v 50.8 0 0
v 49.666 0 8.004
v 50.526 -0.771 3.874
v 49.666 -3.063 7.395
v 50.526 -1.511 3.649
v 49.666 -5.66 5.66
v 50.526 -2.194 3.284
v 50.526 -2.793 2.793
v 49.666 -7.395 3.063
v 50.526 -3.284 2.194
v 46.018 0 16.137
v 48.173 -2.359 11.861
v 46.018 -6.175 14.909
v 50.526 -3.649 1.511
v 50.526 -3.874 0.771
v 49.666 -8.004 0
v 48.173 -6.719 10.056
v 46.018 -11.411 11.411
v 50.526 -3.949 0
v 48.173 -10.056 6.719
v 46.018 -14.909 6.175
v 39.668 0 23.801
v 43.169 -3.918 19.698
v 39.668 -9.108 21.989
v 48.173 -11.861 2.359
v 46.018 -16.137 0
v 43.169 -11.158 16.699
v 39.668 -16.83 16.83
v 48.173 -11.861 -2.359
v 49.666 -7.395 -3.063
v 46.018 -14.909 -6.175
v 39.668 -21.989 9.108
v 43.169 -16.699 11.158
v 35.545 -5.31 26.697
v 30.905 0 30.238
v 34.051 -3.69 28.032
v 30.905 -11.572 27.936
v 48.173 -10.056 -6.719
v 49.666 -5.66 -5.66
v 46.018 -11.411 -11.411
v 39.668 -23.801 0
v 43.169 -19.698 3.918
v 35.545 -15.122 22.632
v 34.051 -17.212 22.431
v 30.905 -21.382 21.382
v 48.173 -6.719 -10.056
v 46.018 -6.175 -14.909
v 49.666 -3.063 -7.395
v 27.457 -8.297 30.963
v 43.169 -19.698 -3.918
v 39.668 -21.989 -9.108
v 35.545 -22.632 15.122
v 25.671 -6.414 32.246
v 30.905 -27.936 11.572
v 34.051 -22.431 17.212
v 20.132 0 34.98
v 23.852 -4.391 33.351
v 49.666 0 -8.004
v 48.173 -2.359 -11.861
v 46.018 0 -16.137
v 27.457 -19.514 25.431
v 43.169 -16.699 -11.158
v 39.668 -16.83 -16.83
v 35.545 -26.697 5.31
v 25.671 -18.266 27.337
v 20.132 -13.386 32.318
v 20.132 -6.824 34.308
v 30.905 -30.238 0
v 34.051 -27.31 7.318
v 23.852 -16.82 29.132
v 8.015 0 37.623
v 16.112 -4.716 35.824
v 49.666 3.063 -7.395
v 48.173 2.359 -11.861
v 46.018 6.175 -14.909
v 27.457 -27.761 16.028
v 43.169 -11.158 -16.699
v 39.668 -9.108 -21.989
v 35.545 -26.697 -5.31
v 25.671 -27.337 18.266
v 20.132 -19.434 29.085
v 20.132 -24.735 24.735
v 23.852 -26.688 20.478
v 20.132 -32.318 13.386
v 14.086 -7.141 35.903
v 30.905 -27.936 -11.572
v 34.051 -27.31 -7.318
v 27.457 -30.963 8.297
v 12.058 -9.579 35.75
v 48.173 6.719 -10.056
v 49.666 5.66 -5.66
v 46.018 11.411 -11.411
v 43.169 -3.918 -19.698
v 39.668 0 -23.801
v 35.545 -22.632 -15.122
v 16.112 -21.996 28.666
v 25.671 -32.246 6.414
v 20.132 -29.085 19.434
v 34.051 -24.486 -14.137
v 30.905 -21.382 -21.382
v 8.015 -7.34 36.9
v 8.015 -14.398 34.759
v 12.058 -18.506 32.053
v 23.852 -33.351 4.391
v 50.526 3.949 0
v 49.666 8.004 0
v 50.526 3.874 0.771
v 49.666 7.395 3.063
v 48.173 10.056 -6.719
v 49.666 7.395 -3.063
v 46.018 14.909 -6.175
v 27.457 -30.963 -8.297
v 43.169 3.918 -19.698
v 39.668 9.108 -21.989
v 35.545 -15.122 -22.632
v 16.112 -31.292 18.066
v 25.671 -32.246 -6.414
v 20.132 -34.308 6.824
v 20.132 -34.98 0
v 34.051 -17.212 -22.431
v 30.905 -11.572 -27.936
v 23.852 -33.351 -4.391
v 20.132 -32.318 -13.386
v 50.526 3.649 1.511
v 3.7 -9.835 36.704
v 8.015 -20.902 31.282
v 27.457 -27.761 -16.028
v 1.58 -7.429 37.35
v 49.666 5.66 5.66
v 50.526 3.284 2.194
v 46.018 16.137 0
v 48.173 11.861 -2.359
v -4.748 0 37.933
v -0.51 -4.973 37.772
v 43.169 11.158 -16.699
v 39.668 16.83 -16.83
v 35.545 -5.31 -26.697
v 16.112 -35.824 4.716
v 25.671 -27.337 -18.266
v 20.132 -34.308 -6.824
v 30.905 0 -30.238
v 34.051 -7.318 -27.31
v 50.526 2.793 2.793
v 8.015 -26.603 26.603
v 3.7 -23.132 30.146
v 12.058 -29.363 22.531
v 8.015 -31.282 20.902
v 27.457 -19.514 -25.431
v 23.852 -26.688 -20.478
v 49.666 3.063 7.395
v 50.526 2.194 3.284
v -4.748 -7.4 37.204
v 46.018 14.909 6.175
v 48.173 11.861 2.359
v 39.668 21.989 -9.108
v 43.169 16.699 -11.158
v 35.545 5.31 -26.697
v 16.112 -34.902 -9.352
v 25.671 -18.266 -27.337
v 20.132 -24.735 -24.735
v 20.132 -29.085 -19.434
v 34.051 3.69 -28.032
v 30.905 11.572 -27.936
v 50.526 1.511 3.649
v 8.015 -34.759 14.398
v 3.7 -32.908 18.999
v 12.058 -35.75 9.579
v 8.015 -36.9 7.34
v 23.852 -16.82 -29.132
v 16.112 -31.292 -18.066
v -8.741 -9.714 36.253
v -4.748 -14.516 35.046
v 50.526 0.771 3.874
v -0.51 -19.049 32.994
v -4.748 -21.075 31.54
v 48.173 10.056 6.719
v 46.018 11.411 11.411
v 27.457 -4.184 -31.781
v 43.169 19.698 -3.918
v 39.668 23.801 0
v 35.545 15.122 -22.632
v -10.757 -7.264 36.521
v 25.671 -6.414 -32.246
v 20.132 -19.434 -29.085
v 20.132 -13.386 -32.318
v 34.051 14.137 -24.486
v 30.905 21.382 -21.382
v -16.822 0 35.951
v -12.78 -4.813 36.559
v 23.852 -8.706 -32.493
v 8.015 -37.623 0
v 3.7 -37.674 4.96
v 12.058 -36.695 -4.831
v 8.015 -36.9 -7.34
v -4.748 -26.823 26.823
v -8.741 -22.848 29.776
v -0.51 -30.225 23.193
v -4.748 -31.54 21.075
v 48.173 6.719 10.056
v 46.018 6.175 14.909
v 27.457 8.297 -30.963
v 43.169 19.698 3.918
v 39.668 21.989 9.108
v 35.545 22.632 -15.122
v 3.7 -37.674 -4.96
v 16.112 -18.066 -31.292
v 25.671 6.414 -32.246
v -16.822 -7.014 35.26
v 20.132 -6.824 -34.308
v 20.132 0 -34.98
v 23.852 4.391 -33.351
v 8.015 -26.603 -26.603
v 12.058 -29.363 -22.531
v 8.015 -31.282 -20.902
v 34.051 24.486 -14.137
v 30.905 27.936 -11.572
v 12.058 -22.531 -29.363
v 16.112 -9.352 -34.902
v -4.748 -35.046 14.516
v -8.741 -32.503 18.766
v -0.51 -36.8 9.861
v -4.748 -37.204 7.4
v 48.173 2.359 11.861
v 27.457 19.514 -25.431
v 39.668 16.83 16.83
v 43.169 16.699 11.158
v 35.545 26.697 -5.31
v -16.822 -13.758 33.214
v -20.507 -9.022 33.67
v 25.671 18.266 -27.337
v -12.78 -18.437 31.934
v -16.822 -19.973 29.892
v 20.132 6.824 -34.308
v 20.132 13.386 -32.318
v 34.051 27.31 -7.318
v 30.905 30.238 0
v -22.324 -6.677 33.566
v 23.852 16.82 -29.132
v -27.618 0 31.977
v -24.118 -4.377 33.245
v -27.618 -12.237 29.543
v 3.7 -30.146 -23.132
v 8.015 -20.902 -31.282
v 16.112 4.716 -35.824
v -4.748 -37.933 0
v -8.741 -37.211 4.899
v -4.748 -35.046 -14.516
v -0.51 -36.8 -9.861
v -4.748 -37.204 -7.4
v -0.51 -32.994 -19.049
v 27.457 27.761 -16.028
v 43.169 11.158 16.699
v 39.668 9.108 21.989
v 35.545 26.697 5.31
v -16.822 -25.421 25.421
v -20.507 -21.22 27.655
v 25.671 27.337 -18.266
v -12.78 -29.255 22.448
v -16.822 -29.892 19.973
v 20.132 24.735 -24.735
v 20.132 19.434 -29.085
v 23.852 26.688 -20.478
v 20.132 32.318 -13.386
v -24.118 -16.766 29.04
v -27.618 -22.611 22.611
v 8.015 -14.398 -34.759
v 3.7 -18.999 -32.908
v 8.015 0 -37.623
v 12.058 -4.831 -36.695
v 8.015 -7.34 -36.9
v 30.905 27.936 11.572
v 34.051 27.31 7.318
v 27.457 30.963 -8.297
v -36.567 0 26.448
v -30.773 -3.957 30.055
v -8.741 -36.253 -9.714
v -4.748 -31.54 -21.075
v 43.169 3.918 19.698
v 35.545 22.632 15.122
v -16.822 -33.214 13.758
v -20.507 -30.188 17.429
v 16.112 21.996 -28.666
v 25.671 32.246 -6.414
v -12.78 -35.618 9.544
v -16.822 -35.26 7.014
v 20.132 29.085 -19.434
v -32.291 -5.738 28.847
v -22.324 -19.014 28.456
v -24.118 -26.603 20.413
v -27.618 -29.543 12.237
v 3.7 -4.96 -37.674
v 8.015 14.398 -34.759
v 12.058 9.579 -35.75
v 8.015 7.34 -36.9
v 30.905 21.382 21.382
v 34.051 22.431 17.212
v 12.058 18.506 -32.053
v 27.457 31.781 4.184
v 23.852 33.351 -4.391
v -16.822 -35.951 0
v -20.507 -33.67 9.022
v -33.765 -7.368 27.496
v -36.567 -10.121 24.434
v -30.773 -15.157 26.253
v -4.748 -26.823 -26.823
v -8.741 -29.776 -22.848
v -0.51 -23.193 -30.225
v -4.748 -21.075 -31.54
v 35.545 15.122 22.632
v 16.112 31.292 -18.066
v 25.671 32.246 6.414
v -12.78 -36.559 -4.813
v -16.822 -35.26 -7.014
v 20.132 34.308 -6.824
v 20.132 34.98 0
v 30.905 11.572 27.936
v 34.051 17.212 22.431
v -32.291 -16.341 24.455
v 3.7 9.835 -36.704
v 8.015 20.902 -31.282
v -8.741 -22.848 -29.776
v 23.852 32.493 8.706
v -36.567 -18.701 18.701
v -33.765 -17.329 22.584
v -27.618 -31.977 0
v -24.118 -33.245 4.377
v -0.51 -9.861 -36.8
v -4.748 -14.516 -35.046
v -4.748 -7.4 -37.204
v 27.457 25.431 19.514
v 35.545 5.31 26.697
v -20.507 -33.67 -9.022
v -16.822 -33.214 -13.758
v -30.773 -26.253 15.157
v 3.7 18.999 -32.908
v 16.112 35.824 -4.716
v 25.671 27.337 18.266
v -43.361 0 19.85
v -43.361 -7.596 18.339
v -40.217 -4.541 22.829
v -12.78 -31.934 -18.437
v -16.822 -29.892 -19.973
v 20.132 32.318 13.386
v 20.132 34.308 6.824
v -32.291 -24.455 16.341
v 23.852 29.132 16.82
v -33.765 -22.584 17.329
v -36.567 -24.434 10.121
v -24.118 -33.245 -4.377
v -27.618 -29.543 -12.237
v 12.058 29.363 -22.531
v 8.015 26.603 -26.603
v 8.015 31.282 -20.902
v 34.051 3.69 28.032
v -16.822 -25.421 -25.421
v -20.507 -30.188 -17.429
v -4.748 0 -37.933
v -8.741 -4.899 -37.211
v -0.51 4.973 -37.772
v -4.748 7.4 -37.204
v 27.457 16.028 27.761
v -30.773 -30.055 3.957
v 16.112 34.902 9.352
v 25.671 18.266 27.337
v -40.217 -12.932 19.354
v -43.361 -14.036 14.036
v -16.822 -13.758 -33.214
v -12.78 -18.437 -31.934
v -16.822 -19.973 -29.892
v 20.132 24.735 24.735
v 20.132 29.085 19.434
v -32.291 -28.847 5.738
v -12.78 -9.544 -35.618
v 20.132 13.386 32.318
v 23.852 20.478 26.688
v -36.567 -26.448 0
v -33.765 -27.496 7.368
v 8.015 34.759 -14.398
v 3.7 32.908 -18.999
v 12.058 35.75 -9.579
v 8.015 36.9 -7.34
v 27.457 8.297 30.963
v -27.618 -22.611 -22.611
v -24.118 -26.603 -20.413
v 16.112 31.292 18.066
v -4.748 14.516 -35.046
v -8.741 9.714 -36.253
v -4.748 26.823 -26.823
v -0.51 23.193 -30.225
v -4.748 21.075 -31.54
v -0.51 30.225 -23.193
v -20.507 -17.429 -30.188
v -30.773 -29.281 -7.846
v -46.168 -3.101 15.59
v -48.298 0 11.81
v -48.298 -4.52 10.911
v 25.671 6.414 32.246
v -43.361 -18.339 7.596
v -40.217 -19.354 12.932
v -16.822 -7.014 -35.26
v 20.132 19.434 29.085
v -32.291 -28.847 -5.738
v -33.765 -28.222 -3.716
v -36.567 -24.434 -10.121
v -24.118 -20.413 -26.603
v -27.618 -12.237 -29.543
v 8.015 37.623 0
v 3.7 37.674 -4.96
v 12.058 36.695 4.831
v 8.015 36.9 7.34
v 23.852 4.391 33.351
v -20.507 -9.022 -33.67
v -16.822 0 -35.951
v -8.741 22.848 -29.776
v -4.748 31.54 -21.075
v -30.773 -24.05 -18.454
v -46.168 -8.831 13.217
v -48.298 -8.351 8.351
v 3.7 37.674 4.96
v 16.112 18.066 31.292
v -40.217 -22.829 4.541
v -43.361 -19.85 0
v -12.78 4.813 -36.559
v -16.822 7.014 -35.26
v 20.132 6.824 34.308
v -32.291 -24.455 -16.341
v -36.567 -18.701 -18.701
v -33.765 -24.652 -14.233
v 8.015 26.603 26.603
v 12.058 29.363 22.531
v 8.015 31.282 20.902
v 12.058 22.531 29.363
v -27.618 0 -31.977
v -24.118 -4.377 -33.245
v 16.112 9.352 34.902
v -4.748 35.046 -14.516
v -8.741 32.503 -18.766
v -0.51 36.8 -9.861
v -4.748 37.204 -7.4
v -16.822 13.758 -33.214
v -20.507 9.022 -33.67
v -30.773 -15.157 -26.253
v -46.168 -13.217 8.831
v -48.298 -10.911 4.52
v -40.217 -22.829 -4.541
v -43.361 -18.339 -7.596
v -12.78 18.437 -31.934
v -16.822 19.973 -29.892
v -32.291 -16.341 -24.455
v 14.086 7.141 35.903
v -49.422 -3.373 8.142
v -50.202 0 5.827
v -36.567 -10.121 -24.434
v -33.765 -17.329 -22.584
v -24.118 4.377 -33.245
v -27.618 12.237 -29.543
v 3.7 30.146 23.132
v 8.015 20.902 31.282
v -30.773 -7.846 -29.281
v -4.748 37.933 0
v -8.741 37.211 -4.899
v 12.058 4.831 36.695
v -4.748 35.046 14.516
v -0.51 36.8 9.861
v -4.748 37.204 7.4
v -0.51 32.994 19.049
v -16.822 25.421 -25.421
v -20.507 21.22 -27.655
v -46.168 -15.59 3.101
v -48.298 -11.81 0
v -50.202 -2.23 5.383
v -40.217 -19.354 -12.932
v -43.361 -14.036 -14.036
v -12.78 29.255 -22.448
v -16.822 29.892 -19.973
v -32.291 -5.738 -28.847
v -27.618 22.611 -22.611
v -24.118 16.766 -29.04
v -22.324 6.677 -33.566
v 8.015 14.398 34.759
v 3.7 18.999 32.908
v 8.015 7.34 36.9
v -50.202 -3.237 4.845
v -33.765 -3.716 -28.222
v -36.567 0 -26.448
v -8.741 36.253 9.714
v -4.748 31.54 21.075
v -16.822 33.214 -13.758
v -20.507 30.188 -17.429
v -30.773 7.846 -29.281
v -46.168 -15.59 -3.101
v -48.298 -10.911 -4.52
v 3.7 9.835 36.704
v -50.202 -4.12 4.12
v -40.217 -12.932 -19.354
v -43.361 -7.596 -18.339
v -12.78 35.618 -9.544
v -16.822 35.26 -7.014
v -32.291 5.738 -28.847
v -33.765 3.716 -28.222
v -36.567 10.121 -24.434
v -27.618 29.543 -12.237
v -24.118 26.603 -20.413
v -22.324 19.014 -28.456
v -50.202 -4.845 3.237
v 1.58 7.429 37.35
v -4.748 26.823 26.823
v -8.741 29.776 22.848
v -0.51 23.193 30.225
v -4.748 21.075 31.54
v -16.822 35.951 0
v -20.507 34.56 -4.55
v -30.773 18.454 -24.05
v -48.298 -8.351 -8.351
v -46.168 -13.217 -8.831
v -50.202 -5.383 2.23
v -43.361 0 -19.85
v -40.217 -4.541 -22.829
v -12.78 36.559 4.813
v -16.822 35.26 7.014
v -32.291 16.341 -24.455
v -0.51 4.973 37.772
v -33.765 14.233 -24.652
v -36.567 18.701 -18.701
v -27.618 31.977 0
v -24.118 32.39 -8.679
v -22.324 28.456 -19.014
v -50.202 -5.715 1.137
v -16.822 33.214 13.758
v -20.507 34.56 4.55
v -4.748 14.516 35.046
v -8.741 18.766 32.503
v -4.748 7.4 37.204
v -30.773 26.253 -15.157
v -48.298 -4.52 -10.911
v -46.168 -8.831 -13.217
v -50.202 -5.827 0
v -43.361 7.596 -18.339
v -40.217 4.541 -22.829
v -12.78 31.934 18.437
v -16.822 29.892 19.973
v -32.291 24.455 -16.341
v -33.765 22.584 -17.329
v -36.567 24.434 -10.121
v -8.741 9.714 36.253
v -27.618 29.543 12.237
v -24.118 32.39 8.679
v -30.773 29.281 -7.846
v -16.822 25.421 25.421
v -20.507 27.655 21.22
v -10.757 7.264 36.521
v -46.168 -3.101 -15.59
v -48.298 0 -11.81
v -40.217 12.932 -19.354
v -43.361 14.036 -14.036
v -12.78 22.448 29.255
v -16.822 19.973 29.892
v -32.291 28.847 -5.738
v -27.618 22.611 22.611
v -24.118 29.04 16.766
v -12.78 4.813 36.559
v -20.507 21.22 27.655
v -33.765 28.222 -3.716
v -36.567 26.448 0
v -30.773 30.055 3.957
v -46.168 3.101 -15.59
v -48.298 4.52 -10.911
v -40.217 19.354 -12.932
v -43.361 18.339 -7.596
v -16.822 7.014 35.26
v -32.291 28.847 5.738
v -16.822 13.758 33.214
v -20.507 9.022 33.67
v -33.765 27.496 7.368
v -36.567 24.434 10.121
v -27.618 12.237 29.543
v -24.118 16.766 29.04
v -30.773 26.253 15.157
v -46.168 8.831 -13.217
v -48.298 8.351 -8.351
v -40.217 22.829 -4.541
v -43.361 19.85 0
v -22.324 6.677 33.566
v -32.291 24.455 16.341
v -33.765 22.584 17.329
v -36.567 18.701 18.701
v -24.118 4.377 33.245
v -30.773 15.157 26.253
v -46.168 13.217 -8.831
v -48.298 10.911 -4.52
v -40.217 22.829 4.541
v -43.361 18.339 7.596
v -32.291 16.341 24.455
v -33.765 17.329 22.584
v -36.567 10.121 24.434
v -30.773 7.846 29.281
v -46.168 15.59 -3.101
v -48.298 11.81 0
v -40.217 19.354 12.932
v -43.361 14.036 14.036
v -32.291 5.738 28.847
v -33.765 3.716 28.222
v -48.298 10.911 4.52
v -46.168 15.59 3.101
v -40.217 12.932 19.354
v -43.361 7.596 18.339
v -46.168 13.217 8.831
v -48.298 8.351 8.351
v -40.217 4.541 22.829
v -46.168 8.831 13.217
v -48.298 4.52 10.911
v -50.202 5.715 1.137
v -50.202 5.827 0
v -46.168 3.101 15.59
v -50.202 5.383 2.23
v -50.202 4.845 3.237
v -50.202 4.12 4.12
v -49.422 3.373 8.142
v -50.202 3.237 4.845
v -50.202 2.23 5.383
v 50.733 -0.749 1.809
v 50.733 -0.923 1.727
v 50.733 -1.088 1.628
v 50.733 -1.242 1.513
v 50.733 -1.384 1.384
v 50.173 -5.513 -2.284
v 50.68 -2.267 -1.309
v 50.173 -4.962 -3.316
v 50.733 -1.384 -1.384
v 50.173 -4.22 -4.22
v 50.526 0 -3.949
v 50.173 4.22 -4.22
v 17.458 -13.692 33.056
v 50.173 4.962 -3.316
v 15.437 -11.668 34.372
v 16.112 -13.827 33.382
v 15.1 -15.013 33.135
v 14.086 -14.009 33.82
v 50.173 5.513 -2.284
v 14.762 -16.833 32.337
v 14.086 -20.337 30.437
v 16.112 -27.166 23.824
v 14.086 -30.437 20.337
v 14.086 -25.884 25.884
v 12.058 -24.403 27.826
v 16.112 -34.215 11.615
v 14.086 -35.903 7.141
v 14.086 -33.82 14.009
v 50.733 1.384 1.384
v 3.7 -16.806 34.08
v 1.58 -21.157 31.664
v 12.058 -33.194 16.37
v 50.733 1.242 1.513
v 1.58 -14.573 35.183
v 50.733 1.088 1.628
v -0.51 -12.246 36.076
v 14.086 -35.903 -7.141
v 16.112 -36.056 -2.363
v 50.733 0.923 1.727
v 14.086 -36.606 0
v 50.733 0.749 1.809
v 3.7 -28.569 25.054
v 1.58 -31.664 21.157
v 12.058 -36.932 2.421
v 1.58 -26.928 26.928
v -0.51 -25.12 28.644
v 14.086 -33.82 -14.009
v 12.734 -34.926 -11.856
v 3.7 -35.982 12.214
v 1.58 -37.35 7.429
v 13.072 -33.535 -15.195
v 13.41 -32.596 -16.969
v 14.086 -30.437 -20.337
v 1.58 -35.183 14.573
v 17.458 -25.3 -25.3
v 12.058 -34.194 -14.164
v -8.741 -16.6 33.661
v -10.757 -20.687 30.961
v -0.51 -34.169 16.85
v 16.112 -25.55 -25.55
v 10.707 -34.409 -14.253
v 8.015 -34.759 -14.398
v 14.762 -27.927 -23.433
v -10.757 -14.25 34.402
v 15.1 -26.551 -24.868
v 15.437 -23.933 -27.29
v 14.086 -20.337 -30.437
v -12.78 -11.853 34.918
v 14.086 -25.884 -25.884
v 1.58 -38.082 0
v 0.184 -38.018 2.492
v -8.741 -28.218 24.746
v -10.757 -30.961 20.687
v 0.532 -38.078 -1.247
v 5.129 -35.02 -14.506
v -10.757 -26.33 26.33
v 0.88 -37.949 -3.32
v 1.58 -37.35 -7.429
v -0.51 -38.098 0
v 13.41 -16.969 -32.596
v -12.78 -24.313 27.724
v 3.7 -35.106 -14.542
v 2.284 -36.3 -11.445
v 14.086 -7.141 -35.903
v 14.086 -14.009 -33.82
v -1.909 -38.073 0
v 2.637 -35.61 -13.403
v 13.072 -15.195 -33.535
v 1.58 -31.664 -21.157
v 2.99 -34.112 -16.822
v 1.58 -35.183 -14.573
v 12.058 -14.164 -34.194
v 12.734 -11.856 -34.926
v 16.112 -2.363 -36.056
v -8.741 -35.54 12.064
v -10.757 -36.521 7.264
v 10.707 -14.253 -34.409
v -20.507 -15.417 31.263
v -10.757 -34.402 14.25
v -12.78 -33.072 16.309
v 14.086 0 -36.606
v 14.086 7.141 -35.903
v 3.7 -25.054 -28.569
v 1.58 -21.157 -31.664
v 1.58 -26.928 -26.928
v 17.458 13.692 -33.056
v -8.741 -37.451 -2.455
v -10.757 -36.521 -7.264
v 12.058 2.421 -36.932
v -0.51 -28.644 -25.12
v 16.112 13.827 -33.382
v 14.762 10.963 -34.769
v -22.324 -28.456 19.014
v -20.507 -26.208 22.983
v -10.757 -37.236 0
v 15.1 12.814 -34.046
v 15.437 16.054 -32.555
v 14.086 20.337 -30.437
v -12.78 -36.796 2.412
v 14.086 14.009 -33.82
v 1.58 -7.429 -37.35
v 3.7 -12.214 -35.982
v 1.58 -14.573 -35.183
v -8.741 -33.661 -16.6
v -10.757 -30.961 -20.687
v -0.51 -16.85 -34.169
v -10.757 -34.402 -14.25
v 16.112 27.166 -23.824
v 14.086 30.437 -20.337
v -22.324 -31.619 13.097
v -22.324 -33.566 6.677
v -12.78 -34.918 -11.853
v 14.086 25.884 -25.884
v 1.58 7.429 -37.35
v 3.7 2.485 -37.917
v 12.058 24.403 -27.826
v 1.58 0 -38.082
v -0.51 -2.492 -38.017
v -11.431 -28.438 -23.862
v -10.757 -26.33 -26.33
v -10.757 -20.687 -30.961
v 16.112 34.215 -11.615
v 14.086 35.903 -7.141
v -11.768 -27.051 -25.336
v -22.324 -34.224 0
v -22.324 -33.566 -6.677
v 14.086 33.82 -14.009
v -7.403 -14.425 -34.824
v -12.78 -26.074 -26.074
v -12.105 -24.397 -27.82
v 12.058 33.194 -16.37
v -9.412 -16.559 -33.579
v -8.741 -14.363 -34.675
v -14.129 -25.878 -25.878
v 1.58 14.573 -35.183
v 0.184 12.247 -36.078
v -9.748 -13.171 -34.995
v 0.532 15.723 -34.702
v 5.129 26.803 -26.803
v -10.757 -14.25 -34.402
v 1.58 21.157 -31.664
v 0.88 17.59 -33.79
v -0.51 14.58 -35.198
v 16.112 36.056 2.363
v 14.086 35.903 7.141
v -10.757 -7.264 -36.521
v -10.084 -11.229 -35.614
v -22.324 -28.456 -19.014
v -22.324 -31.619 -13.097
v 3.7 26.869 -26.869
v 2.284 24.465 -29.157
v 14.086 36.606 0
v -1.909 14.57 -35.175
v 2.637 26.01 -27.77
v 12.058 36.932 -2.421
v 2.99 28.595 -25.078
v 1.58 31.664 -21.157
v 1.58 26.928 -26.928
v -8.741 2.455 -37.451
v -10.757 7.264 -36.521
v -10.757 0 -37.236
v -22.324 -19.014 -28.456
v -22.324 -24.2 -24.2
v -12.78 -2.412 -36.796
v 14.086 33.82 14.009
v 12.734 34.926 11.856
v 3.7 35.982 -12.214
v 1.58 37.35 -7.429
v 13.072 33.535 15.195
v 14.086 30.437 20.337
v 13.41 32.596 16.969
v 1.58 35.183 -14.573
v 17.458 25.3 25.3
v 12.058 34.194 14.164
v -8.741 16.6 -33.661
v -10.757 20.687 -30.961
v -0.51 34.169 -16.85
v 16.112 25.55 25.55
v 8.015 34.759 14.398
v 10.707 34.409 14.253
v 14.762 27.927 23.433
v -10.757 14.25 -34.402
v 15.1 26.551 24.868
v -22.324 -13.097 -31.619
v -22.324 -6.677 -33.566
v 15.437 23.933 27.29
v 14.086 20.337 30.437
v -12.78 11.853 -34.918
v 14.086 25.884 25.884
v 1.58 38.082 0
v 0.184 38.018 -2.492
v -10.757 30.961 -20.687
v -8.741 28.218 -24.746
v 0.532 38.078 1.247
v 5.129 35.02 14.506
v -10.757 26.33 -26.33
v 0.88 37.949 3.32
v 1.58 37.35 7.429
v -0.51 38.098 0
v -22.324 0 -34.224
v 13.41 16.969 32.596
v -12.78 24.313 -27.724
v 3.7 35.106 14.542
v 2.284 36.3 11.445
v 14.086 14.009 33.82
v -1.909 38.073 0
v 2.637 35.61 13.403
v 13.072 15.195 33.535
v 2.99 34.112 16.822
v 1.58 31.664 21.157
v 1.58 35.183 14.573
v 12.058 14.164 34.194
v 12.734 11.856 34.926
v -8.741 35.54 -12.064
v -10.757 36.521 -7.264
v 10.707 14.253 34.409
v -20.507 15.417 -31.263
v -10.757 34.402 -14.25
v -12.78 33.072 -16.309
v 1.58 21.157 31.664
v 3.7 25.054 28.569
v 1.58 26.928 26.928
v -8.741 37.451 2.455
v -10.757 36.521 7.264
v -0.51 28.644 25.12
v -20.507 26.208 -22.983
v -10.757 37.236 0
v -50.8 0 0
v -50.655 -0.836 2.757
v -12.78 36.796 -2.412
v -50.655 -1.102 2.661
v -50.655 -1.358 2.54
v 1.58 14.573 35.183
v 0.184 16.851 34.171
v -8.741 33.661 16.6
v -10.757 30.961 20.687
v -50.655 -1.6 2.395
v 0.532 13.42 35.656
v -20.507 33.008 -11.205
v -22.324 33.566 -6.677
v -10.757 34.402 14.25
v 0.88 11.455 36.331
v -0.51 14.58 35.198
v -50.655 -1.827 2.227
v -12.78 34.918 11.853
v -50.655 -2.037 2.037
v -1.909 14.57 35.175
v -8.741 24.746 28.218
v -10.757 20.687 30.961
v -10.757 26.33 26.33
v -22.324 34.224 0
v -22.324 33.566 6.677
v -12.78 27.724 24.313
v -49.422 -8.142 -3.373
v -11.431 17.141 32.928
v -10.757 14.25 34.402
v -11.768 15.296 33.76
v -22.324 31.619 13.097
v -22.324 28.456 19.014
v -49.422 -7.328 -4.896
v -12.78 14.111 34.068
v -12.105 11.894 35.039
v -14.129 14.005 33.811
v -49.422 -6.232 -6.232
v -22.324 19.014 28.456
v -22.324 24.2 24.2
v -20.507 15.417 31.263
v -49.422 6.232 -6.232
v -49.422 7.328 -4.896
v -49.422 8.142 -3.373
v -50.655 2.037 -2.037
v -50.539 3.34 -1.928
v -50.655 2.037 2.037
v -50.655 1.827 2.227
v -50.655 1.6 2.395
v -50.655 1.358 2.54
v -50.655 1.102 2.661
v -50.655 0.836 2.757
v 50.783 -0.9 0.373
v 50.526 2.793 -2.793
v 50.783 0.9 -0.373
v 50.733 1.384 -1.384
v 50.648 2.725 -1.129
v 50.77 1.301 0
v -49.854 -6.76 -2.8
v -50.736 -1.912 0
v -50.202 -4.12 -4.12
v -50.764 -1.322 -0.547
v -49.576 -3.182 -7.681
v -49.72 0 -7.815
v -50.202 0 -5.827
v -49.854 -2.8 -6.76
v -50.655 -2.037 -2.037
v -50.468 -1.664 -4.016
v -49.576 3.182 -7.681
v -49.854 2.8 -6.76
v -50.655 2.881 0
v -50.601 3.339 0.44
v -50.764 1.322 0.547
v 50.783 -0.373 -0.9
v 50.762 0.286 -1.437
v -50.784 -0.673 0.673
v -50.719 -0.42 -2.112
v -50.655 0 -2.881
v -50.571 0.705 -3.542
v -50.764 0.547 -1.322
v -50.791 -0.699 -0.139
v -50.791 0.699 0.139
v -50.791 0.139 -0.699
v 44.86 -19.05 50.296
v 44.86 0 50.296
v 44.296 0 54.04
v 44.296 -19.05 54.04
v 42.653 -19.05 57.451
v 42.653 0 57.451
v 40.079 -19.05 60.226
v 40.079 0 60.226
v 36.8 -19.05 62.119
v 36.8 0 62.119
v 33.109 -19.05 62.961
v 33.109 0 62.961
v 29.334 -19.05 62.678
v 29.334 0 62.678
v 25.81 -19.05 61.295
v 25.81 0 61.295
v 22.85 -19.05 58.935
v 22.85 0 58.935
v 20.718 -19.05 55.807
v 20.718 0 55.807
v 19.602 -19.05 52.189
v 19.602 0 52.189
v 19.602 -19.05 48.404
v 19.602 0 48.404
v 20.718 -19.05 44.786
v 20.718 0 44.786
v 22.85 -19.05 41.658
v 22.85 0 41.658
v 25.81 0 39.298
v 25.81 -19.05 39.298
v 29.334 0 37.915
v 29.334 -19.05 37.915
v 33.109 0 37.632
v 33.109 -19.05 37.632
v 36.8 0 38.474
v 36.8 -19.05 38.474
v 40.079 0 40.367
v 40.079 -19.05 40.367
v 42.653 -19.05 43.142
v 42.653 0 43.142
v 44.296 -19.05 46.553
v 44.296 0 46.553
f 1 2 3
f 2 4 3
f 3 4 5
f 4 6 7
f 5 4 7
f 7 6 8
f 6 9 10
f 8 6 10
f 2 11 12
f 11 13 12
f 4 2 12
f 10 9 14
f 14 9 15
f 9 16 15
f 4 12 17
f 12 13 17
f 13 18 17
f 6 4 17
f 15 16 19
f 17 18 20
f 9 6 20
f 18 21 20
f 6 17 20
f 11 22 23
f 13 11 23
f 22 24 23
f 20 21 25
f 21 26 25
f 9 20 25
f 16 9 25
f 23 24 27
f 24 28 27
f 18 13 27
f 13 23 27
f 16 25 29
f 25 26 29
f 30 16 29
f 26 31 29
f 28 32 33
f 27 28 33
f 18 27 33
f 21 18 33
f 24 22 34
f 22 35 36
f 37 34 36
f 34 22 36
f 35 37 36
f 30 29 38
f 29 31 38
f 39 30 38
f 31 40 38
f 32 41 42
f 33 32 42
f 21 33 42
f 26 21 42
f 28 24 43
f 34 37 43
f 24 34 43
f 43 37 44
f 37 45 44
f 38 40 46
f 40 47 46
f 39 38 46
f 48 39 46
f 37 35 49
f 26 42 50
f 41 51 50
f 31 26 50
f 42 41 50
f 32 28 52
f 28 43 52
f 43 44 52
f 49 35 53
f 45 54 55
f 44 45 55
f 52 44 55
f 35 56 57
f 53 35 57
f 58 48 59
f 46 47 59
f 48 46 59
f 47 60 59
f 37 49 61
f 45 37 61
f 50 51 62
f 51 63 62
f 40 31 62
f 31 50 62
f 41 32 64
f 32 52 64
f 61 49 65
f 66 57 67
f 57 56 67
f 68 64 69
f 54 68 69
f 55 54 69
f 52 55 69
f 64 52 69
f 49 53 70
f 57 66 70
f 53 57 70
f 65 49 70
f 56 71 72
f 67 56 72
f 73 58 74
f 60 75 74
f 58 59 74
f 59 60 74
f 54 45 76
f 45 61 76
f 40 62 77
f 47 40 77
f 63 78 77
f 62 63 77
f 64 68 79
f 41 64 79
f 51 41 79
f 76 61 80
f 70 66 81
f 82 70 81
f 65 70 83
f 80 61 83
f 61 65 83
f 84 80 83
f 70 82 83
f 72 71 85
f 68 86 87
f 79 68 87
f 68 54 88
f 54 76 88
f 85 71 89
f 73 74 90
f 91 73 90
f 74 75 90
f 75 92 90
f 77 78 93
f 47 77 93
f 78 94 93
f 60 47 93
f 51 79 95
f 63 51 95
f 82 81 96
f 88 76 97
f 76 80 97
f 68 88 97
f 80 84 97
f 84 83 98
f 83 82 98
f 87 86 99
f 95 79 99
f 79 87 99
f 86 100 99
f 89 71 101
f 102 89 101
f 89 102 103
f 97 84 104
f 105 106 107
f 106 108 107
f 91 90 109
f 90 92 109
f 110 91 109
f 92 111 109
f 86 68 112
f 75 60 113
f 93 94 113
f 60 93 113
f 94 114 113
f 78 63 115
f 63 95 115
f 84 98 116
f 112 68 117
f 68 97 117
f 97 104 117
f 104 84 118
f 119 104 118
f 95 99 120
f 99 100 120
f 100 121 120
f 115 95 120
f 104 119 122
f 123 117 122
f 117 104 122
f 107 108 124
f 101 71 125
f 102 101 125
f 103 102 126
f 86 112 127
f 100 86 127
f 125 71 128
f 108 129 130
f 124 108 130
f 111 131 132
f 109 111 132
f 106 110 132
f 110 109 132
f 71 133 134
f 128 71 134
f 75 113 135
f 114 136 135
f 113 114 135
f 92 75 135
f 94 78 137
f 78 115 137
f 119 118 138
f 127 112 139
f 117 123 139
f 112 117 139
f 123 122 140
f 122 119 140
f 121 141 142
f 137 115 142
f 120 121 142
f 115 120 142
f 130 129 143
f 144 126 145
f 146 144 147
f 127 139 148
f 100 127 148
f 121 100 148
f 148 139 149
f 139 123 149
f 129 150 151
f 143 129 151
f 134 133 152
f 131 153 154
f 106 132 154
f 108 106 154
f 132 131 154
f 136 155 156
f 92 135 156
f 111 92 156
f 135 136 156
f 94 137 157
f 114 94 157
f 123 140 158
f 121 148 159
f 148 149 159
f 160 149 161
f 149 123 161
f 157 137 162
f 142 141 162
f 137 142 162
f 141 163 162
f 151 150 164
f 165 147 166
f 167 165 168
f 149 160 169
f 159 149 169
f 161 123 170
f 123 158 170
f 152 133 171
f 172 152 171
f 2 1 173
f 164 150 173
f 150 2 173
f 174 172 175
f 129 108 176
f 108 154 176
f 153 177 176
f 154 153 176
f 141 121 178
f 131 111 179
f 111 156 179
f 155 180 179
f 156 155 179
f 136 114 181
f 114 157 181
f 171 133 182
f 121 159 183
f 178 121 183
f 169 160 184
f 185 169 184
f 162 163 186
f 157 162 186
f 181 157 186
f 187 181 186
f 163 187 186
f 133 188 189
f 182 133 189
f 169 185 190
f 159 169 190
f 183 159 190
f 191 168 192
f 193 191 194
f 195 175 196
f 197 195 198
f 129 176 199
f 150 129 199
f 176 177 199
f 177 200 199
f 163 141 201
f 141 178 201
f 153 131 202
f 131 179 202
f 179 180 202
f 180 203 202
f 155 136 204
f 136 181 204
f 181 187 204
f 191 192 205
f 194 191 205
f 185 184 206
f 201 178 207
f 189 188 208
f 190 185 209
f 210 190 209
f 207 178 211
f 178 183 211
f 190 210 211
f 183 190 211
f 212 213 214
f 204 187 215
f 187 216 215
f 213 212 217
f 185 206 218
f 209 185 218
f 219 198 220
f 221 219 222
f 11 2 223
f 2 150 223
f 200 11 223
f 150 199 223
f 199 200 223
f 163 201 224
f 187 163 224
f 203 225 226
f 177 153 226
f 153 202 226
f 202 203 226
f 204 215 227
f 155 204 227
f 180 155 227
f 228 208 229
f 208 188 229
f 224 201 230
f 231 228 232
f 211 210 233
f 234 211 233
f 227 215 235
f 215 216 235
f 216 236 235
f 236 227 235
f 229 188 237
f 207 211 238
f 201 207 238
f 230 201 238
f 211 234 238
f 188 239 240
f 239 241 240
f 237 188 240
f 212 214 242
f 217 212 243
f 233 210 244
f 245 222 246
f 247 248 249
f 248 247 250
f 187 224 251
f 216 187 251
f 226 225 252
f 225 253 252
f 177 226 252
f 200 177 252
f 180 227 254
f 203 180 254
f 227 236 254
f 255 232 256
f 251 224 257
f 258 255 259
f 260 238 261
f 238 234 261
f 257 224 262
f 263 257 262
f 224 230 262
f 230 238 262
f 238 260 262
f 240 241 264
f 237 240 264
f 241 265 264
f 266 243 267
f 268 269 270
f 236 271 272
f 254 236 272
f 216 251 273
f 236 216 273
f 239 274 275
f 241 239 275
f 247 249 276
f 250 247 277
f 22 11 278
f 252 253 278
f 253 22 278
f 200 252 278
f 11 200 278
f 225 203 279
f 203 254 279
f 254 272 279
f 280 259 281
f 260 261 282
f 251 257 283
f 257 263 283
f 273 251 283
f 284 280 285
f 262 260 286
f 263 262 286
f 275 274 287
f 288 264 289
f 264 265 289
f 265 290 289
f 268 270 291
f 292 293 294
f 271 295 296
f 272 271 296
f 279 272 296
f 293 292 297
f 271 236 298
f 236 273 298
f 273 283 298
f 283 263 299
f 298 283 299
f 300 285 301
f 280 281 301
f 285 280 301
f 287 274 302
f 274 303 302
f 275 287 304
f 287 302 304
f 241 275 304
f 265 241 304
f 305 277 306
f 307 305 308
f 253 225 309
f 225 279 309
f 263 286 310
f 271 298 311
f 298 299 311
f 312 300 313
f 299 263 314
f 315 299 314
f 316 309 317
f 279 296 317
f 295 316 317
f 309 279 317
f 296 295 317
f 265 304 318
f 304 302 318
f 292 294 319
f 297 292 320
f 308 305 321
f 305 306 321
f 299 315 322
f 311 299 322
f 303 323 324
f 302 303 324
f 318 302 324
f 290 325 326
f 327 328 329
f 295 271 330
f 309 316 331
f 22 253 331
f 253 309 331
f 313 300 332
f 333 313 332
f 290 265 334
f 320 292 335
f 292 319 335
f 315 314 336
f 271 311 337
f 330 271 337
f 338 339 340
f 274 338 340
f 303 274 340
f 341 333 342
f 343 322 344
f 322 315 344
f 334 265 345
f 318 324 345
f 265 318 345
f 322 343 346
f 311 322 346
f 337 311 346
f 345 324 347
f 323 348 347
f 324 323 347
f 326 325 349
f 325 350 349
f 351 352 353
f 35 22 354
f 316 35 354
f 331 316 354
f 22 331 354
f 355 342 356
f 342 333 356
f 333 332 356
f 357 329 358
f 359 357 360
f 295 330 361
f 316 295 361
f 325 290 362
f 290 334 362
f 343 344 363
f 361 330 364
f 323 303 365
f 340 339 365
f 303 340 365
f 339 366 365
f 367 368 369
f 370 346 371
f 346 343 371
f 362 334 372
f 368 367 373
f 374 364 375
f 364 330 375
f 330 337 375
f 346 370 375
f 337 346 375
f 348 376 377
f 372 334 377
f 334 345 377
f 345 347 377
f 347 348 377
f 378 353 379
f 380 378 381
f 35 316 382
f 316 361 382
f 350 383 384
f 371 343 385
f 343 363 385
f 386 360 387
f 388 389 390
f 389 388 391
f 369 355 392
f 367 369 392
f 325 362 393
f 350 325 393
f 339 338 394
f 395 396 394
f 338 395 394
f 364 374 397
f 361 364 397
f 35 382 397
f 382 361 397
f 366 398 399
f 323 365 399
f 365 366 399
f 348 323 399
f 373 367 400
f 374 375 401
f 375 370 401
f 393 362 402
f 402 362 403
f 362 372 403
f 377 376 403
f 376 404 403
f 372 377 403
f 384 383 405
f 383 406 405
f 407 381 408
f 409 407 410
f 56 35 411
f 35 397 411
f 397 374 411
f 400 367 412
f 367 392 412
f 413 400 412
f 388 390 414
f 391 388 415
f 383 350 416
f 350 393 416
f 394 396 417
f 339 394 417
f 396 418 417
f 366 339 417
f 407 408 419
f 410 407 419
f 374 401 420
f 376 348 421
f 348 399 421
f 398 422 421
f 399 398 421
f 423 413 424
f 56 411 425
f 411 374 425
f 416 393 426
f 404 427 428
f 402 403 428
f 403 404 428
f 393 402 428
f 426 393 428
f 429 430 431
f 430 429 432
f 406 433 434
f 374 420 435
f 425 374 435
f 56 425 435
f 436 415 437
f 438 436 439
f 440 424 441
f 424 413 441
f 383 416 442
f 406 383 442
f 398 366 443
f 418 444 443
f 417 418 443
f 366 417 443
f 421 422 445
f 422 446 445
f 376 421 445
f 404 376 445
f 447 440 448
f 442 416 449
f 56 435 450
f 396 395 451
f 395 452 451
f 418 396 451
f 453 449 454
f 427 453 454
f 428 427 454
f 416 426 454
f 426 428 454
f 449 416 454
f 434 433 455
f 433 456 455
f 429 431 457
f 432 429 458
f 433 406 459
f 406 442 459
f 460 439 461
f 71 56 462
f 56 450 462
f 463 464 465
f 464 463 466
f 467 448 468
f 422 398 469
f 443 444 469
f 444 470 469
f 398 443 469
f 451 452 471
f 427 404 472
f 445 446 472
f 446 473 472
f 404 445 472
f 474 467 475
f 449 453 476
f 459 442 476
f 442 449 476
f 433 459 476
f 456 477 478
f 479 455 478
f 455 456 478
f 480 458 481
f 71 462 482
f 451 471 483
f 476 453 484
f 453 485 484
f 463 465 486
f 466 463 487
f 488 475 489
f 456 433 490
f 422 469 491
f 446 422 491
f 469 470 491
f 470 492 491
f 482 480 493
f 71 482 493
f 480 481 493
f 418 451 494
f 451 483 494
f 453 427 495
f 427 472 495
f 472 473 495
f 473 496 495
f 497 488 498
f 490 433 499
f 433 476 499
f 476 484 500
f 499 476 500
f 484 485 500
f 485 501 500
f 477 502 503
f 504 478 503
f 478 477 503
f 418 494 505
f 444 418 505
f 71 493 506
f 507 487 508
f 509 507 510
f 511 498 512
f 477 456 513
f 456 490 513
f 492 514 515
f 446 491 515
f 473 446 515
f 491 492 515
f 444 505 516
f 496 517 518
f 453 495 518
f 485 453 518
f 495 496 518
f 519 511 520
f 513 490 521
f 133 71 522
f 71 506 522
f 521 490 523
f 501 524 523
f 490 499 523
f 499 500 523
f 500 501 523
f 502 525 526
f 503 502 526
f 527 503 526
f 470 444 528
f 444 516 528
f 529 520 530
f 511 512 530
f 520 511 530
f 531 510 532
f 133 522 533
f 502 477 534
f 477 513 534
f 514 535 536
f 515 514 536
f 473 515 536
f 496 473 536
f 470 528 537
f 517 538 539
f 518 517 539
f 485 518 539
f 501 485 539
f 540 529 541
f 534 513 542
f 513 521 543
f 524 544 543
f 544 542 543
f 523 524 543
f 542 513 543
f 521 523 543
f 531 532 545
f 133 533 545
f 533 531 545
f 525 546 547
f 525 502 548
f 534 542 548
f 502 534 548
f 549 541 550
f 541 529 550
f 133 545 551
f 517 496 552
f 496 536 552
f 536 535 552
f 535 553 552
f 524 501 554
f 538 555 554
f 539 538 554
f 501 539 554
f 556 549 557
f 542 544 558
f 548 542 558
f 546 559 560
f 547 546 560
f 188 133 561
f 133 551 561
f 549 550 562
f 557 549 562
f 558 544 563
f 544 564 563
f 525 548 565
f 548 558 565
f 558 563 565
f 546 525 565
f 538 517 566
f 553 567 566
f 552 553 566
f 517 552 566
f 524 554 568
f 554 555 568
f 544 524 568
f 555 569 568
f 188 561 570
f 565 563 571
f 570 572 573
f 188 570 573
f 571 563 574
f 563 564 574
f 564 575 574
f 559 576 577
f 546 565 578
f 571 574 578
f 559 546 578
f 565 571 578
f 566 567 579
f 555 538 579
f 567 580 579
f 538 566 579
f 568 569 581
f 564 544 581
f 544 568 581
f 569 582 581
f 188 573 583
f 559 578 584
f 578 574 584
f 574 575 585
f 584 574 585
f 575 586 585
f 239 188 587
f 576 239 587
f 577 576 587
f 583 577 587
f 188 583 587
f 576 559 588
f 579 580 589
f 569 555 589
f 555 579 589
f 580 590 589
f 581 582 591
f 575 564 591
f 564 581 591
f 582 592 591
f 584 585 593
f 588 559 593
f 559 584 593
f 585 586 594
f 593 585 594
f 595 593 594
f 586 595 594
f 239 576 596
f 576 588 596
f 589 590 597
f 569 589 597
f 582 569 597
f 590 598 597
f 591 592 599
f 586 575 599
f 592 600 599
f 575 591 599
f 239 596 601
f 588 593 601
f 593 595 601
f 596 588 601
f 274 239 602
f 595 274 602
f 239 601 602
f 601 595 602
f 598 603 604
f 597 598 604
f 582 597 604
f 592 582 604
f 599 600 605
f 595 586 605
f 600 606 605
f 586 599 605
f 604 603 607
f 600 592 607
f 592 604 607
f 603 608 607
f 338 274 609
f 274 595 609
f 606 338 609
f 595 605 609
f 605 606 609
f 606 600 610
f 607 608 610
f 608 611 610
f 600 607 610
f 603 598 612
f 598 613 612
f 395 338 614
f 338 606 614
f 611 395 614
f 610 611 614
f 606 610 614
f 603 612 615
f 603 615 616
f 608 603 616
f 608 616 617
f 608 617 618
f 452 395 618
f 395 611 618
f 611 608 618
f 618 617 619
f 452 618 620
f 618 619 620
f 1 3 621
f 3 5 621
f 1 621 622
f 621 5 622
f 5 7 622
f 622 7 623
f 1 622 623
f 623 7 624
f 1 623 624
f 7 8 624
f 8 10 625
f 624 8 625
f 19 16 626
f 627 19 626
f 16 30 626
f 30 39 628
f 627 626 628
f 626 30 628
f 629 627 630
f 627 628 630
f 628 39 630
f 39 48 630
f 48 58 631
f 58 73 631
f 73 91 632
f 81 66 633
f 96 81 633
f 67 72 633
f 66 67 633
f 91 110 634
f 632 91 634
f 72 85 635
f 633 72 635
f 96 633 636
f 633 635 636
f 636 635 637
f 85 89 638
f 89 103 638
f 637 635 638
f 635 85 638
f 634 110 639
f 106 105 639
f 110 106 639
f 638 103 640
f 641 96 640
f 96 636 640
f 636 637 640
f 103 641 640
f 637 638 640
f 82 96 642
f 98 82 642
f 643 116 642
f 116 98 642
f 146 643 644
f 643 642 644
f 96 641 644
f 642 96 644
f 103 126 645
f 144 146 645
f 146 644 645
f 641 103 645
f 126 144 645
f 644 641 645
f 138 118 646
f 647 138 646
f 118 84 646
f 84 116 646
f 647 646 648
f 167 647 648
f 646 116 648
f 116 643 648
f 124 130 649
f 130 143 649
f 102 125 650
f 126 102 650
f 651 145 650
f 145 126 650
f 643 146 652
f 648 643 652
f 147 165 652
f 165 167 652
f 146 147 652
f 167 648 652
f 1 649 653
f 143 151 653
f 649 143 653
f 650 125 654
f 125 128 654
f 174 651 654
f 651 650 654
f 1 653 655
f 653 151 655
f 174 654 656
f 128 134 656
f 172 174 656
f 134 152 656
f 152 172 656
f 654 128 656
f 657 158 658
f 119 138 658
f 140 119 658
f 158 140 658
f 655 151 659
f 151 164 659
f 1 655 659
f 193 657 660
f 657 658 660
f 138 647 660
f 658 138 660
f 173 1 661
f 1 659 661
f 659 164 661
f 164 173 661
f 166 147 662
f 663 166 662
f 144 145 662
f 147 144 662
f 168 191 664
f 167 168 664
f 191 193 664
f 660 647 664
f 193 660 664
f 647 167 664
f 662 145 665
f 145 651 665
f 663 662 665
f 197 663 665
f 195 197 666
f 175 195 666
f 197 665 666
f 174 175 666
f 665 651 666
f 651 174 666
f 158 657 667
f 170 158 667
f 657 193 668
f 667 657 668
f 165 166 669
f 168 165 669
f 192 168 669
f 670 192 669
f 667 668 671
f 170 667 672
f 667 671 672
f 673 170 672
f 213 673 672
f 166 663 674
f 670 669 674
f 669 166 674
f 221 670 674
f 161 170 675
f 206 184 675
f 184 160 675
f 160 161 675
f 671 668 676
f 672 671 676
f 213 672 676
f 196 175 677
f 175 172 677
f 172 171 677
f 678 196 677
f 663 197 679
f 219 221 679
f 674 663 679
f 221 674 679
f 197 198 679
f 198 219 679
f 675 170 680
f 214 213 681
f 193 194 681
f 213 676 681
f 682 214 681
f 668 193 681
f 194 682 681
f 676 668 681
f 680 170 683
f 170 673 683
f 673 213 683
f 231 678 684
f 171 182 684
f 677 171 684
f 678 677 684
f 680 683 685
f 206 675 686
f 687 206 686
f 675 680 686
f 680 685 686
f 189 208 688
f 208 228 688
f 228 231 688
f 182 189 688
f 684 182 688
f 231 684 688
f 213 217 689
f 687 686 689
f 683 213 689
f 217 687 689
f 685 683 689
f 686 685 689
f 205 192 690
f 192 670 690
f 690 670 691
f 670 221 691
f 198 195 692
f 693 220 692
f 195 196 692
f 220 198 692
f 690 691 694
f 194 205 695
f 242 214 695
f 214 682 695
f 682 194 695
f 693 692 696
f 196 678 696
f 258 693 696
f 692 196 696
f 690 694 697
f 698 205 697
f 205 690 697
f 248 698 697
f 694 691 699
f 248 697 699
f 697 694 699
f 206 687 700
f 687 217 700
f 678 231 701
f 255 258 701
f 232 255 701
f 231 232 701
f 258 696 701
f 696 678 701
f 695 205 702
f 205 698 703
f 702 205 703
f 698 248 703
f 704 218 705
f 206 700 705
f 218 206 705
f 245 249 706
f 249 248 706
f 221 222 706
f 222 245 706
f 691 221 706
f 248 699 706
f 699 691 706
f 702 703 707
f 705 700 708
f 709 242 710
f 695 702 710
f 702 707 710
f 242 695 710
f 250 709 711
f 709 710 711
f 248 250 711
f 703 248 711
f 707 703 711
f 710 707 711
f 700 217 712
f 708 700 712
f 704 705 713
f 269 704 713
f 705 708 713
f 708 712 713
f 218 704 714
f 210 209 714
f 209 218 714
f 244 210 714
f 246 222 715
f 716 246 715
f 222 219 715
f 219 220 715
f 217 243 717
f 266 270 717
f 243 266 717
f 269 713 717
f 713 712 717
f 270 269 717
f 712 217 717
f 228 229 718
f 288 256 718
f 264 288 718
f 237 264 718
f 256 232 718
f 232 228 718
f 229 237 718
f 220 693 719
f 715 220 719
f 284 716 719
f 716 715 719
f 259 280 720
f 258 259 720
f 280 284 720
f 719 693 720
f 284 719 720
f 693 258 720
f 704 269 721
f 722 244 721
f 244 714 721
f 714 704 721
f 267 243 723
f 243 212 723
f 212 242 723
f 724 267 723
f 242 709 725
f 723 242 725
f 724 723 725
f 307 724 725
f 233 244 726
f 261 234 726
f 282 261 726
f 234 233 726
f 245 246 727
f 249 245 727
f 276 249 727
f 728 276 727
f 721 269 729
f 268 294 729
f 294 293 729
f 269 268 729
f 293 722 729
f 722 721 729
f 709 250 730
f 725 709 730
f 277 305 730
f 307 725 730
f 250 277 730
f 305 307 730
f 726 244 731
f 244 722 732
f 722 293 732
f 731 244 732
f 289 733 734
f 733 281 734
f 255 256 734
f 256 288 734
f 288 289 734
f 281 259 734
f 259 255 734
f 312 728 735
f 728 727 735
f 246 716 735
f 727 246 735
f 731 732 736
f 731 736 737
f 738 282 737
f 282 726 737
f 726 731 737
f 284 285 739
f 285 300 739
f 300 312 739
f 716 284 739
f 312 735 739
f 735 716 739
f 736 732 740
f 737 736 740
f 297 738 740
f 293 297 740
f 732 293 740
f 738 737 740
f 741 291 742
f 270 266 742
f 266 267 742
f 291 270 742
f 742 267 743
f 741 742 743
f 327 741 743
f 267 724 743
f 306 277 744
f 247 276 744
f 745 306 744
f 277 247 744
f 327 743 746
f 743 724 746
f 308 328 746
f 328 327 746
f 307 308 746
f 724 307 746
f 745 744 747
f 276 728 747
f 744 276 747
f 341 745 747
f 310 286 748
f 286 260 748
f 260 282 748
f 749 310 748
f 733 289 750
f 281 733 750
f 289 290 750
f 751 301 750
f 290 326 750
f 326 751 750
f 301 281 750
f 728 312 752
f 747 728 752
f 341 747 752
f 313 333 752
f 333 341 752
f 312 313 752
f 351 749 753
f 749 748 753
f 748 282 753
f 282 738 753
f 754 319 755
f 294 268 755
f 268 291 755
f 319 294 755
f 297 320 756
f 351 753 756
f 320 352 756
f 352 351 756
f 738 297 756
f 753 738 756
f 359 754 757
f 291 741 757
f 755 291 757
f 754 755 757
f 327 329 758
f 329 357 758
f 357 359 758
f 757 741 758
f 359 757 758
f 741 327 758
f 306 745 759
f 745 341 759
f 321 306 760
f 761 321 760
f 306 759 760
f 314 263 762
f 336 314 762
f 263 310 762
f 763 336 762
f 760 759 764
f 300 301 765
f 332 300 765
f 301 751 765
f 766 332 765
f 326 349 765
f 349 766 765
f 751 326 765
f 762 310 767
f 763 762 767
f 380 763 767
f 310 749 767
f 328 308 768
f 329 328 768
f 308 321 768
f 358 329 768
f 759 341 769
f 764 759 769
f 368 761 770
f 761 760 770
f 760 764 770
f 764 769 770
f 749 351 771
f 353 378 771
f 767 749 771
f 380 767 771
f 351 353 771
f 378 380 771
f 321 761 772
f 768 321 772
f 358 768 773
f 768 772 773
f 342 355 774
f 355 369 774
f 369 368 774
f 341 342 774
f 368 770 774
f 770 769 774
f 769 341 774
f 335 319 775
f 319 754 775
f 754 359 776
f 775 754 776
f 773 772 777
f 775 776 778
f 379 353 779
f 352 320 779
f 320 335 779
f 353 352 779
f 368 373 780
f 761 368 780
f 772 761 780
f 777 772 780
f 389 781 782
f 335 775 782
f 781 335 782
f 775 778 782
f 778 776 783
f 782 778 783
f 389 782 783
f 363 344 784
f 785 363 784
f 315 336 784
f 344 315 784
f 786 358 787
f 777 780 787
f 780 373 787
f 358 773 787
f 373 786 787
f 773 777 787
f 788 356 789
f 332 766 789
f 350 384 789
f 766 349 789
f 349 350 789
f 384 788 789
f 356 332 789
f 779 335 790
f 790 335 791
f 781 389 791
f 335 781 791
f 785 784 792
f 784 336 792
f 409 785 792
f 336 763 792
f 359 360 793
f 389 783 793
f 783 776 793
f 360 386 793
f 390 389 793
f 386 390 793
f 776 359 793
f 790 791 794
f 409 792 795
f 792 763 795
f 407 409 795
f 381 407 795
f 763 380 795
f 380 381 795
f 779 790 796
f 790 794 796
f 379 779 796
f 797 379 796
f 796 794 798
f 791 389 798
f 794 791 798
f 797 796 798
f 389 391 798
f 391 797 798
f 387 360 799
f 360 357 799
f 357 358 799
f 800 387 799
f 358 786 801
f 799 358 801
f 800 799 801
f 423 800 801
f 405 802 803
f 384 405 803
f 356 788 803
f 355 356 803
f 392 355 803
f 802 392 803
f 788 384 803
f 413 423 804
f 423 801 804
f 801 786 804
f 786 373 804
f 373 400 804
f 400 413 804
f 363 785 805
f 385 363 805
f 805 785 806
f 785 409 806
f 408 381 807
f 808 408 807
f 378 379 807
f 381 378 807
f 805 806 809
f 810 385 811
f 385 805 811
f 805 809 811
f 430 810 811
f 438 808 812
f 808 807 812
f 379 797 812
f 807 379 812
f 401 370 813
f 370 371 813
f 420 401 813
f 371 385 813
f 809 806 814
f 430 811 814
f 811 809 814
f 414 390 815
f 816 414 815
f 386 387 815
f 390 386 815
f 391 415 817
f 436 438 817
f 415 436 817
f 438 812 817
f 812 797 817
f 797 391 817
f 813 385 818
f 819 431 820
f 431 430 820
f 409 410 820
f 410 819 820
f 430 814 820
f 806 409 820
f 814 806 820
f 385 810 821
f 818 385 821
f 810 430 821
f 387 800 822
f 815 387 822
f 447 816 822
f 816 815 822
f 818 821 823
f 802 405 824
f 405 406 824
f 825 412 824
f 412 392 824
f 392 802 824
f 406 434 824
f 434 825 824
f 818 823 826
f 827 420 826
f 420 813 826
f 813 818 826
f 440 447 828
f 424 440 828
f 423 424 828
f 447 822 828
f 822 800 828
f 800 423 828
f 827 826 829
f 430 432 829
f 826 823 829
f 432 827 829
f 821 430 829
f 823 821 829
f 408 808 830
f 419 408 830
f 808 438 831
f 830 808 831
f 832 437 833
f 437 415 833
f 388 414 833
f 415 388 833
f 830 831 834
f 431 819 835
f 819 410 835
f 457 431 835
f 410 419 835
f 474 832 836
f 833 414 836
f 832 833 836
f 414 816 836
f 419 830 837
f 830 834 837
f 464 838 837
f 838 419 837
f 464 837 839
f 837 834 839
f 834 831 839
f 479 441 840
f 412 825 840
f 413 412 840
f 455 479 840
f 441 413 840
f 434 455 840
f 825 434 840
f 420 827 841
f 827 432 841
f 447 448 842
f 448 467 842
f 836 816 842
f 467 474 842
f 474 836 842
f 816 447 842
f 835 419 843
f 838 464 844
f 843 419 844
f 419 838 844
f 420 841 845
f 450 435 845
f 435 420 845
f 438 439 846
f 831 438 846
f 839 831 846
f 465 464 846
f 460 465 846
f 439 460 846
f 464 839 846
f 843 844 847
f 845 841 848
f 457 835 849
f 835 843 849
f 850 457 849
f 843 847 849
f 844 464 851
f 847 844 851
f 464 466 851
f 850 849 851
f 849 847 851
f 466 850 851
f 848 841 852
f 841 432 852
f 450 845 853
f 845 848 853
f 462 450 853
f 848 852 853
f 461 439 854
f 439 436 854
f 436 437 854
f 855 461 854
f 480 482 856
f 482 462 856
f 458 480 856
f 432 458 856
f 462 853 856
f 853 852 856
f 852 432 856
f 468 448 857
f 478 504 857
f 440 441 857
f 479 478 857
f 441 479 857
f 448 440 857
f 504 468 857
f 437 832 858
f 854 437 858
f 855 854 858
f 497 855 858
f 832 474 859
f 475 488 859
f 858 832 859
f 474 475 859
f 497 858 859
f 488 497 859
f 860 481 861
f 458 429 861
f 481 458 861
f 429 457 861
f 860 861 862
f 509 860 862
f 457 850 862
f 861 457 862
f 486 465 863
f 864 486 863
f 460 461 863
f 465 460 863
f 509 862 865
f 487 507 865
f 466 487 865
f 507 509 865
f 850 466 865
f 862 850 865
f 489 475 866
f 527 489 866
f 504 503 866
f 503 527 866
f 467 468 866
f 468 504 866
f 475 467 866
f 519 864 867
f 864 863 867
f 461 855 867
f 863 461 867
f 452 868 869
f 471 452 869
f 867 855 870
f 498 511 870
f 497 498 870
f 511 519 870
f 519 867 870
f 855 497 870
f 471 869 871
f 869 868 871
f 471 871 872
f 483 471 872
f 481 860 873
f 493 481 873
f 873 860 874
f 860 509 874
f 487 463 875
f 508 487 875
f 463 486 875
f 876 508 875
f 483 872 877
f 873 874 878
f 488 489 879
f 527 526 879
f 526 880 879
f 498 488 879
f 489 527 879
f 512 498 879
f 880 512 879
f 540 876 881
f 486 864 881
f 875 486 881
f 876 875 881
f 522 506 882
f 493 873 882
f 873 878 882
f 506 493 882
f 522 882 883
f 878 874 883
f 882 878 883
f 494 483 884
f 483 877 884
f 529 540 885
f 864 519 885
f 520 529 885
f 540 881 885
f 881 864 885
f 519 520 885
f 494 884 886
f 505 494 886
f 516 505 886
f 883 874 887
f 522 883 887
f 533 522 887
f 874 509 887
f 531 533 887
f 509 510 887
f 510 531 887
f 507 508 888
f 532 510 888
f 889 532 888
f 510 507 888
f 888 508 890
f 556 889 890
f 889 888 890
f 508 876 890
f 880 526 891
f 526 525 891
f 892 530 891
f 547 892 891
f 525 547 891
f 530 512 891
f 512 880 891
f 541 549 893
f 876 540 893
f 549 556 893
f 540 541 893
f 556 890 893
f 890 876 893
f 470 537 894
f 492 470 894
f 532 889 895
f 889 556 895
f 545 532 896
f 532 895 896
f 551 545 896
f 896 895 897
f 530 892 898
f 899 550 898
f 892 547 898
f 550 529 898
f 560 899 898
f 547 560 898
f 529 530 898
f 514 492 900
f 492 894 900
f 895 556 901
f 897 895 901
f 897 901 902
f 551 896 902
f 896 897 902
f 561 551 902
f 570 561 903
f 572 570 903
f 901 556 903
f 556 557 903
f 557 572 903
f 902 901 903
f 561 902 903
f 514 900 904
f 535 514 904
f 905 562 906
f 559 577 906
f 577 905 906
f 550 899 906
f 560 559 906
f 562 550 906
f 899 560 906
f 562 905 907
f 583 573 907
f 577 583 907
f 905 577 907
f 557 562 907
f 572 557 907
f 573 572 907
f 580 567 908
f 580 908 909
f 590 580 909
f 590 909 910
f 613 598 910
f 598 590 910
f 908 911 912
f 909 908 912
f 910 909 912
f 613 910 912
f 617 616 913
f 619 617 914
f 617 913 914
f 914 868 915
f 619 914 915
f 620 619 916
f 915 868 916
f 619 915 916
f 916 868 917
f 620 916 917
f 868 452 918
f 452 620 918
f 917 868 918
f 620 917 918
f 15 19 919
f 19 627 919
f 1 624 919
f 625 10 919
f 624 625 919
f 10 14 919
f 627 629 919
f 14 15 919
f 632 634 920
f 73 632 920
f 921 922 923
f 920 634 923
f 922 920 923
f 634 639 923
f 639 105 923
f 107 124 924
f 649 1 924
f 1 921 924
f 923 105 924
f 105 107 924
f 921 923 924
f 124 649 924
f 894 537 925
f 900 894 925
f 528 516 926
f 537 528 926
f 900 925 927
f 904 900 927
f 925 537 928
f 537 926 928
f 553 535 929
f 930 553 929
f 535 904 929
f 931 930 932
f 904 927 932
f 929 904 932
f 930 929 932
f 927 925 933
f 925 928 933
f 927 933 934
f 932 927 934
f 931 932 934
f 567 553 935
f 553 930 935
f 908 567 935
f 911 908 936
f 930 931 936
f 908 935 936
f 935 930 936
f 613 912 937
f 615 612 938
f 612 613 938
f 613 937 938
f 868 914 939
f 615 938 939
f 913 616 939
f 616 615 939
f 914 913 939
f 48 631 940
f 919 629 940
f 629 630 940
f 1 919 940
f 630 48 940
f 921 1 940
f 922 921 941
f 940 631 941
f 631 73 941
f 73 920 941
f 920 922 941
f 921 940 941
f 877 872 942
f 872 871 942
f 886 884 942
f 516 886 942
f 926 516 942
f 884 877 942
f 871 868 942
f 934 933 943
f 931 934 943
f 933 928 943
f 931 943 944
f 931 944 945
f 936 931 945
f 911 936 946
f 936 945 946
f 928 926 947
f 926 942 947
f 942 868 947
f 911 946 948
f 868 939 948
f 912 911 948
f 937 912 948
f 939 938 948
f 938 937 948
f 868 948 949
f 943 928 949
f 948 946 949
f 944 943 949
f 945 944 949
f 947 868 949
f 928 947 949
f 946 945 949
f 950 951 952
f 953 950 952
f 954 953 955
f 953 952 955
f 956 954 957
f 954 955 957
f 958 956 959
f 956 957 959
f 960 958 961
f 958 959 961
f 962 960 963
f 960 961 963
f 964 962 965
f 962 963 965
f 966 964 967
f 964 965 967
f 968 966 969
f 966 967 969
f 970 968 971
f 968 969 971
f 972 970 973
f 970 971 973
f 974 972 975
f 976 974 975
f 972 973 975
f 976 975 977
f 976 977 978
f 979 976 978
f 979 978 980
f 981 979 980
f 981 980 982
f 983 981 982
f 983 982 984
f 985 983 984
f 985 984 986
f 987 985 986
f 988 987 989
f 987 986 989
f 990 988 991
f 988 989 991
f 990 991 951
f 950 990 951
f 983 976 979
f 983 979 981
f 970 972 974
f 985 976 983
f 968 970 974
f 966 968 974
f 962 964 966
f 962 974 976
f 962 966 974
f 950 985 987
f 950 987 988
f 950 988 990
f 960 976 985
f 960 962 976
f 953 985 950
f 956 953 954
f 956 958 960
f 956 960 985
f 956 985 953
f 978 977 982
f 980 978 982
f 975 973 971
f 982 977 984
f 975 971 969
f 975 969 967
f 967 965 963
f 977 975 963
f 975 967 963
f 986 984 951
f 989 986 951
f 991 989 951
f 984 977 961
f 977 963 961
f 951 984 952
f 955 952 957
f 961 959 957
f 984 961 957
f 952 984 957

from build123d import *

# Parameters (mm, degrees)
F2_R     = 12.7
F3_DEPTH = 19.05


with BuildPart() as f1:
    # F0 (on Front) → F1 (revolve)
    with BuildSketch(Plane.XZ):
        with BuildLine():
            Line((-50.8, 0), (50.8, 0))
            add(Edge.make_bspline(
                [(50.8, 0), (50.8, 38.1), (0, 38.1), (-50.8, 38.1), (-50.8, 0)],
                knots=[0, 0, 0, 1.5707963268, 1.5707963268, 3.1415926536, 3.1415926536, 3.1415926536], degree=2, weights=[1, 0.7071067812, 1, 0.7071067812, 1]))
        make_face()
    revolve(axis=Axis((0, 0, 0), (1, 0, 0)))


with BuildPart() as f3:
    # F2 (on Front) → F3 (new body)
    with BuildSketch(Plane.XZ):
        with Locations((32.1602299809, 50.2964220941)):
            Circle(F2_R)
    extrude(amount=F3_DEPTH)


with BuildPart() as f4_1:
    # F4: copy of F3
    add(f3.part.moved(Location((48.514, 0, 0))))


solid = Compound([f1.part, f3.part])
